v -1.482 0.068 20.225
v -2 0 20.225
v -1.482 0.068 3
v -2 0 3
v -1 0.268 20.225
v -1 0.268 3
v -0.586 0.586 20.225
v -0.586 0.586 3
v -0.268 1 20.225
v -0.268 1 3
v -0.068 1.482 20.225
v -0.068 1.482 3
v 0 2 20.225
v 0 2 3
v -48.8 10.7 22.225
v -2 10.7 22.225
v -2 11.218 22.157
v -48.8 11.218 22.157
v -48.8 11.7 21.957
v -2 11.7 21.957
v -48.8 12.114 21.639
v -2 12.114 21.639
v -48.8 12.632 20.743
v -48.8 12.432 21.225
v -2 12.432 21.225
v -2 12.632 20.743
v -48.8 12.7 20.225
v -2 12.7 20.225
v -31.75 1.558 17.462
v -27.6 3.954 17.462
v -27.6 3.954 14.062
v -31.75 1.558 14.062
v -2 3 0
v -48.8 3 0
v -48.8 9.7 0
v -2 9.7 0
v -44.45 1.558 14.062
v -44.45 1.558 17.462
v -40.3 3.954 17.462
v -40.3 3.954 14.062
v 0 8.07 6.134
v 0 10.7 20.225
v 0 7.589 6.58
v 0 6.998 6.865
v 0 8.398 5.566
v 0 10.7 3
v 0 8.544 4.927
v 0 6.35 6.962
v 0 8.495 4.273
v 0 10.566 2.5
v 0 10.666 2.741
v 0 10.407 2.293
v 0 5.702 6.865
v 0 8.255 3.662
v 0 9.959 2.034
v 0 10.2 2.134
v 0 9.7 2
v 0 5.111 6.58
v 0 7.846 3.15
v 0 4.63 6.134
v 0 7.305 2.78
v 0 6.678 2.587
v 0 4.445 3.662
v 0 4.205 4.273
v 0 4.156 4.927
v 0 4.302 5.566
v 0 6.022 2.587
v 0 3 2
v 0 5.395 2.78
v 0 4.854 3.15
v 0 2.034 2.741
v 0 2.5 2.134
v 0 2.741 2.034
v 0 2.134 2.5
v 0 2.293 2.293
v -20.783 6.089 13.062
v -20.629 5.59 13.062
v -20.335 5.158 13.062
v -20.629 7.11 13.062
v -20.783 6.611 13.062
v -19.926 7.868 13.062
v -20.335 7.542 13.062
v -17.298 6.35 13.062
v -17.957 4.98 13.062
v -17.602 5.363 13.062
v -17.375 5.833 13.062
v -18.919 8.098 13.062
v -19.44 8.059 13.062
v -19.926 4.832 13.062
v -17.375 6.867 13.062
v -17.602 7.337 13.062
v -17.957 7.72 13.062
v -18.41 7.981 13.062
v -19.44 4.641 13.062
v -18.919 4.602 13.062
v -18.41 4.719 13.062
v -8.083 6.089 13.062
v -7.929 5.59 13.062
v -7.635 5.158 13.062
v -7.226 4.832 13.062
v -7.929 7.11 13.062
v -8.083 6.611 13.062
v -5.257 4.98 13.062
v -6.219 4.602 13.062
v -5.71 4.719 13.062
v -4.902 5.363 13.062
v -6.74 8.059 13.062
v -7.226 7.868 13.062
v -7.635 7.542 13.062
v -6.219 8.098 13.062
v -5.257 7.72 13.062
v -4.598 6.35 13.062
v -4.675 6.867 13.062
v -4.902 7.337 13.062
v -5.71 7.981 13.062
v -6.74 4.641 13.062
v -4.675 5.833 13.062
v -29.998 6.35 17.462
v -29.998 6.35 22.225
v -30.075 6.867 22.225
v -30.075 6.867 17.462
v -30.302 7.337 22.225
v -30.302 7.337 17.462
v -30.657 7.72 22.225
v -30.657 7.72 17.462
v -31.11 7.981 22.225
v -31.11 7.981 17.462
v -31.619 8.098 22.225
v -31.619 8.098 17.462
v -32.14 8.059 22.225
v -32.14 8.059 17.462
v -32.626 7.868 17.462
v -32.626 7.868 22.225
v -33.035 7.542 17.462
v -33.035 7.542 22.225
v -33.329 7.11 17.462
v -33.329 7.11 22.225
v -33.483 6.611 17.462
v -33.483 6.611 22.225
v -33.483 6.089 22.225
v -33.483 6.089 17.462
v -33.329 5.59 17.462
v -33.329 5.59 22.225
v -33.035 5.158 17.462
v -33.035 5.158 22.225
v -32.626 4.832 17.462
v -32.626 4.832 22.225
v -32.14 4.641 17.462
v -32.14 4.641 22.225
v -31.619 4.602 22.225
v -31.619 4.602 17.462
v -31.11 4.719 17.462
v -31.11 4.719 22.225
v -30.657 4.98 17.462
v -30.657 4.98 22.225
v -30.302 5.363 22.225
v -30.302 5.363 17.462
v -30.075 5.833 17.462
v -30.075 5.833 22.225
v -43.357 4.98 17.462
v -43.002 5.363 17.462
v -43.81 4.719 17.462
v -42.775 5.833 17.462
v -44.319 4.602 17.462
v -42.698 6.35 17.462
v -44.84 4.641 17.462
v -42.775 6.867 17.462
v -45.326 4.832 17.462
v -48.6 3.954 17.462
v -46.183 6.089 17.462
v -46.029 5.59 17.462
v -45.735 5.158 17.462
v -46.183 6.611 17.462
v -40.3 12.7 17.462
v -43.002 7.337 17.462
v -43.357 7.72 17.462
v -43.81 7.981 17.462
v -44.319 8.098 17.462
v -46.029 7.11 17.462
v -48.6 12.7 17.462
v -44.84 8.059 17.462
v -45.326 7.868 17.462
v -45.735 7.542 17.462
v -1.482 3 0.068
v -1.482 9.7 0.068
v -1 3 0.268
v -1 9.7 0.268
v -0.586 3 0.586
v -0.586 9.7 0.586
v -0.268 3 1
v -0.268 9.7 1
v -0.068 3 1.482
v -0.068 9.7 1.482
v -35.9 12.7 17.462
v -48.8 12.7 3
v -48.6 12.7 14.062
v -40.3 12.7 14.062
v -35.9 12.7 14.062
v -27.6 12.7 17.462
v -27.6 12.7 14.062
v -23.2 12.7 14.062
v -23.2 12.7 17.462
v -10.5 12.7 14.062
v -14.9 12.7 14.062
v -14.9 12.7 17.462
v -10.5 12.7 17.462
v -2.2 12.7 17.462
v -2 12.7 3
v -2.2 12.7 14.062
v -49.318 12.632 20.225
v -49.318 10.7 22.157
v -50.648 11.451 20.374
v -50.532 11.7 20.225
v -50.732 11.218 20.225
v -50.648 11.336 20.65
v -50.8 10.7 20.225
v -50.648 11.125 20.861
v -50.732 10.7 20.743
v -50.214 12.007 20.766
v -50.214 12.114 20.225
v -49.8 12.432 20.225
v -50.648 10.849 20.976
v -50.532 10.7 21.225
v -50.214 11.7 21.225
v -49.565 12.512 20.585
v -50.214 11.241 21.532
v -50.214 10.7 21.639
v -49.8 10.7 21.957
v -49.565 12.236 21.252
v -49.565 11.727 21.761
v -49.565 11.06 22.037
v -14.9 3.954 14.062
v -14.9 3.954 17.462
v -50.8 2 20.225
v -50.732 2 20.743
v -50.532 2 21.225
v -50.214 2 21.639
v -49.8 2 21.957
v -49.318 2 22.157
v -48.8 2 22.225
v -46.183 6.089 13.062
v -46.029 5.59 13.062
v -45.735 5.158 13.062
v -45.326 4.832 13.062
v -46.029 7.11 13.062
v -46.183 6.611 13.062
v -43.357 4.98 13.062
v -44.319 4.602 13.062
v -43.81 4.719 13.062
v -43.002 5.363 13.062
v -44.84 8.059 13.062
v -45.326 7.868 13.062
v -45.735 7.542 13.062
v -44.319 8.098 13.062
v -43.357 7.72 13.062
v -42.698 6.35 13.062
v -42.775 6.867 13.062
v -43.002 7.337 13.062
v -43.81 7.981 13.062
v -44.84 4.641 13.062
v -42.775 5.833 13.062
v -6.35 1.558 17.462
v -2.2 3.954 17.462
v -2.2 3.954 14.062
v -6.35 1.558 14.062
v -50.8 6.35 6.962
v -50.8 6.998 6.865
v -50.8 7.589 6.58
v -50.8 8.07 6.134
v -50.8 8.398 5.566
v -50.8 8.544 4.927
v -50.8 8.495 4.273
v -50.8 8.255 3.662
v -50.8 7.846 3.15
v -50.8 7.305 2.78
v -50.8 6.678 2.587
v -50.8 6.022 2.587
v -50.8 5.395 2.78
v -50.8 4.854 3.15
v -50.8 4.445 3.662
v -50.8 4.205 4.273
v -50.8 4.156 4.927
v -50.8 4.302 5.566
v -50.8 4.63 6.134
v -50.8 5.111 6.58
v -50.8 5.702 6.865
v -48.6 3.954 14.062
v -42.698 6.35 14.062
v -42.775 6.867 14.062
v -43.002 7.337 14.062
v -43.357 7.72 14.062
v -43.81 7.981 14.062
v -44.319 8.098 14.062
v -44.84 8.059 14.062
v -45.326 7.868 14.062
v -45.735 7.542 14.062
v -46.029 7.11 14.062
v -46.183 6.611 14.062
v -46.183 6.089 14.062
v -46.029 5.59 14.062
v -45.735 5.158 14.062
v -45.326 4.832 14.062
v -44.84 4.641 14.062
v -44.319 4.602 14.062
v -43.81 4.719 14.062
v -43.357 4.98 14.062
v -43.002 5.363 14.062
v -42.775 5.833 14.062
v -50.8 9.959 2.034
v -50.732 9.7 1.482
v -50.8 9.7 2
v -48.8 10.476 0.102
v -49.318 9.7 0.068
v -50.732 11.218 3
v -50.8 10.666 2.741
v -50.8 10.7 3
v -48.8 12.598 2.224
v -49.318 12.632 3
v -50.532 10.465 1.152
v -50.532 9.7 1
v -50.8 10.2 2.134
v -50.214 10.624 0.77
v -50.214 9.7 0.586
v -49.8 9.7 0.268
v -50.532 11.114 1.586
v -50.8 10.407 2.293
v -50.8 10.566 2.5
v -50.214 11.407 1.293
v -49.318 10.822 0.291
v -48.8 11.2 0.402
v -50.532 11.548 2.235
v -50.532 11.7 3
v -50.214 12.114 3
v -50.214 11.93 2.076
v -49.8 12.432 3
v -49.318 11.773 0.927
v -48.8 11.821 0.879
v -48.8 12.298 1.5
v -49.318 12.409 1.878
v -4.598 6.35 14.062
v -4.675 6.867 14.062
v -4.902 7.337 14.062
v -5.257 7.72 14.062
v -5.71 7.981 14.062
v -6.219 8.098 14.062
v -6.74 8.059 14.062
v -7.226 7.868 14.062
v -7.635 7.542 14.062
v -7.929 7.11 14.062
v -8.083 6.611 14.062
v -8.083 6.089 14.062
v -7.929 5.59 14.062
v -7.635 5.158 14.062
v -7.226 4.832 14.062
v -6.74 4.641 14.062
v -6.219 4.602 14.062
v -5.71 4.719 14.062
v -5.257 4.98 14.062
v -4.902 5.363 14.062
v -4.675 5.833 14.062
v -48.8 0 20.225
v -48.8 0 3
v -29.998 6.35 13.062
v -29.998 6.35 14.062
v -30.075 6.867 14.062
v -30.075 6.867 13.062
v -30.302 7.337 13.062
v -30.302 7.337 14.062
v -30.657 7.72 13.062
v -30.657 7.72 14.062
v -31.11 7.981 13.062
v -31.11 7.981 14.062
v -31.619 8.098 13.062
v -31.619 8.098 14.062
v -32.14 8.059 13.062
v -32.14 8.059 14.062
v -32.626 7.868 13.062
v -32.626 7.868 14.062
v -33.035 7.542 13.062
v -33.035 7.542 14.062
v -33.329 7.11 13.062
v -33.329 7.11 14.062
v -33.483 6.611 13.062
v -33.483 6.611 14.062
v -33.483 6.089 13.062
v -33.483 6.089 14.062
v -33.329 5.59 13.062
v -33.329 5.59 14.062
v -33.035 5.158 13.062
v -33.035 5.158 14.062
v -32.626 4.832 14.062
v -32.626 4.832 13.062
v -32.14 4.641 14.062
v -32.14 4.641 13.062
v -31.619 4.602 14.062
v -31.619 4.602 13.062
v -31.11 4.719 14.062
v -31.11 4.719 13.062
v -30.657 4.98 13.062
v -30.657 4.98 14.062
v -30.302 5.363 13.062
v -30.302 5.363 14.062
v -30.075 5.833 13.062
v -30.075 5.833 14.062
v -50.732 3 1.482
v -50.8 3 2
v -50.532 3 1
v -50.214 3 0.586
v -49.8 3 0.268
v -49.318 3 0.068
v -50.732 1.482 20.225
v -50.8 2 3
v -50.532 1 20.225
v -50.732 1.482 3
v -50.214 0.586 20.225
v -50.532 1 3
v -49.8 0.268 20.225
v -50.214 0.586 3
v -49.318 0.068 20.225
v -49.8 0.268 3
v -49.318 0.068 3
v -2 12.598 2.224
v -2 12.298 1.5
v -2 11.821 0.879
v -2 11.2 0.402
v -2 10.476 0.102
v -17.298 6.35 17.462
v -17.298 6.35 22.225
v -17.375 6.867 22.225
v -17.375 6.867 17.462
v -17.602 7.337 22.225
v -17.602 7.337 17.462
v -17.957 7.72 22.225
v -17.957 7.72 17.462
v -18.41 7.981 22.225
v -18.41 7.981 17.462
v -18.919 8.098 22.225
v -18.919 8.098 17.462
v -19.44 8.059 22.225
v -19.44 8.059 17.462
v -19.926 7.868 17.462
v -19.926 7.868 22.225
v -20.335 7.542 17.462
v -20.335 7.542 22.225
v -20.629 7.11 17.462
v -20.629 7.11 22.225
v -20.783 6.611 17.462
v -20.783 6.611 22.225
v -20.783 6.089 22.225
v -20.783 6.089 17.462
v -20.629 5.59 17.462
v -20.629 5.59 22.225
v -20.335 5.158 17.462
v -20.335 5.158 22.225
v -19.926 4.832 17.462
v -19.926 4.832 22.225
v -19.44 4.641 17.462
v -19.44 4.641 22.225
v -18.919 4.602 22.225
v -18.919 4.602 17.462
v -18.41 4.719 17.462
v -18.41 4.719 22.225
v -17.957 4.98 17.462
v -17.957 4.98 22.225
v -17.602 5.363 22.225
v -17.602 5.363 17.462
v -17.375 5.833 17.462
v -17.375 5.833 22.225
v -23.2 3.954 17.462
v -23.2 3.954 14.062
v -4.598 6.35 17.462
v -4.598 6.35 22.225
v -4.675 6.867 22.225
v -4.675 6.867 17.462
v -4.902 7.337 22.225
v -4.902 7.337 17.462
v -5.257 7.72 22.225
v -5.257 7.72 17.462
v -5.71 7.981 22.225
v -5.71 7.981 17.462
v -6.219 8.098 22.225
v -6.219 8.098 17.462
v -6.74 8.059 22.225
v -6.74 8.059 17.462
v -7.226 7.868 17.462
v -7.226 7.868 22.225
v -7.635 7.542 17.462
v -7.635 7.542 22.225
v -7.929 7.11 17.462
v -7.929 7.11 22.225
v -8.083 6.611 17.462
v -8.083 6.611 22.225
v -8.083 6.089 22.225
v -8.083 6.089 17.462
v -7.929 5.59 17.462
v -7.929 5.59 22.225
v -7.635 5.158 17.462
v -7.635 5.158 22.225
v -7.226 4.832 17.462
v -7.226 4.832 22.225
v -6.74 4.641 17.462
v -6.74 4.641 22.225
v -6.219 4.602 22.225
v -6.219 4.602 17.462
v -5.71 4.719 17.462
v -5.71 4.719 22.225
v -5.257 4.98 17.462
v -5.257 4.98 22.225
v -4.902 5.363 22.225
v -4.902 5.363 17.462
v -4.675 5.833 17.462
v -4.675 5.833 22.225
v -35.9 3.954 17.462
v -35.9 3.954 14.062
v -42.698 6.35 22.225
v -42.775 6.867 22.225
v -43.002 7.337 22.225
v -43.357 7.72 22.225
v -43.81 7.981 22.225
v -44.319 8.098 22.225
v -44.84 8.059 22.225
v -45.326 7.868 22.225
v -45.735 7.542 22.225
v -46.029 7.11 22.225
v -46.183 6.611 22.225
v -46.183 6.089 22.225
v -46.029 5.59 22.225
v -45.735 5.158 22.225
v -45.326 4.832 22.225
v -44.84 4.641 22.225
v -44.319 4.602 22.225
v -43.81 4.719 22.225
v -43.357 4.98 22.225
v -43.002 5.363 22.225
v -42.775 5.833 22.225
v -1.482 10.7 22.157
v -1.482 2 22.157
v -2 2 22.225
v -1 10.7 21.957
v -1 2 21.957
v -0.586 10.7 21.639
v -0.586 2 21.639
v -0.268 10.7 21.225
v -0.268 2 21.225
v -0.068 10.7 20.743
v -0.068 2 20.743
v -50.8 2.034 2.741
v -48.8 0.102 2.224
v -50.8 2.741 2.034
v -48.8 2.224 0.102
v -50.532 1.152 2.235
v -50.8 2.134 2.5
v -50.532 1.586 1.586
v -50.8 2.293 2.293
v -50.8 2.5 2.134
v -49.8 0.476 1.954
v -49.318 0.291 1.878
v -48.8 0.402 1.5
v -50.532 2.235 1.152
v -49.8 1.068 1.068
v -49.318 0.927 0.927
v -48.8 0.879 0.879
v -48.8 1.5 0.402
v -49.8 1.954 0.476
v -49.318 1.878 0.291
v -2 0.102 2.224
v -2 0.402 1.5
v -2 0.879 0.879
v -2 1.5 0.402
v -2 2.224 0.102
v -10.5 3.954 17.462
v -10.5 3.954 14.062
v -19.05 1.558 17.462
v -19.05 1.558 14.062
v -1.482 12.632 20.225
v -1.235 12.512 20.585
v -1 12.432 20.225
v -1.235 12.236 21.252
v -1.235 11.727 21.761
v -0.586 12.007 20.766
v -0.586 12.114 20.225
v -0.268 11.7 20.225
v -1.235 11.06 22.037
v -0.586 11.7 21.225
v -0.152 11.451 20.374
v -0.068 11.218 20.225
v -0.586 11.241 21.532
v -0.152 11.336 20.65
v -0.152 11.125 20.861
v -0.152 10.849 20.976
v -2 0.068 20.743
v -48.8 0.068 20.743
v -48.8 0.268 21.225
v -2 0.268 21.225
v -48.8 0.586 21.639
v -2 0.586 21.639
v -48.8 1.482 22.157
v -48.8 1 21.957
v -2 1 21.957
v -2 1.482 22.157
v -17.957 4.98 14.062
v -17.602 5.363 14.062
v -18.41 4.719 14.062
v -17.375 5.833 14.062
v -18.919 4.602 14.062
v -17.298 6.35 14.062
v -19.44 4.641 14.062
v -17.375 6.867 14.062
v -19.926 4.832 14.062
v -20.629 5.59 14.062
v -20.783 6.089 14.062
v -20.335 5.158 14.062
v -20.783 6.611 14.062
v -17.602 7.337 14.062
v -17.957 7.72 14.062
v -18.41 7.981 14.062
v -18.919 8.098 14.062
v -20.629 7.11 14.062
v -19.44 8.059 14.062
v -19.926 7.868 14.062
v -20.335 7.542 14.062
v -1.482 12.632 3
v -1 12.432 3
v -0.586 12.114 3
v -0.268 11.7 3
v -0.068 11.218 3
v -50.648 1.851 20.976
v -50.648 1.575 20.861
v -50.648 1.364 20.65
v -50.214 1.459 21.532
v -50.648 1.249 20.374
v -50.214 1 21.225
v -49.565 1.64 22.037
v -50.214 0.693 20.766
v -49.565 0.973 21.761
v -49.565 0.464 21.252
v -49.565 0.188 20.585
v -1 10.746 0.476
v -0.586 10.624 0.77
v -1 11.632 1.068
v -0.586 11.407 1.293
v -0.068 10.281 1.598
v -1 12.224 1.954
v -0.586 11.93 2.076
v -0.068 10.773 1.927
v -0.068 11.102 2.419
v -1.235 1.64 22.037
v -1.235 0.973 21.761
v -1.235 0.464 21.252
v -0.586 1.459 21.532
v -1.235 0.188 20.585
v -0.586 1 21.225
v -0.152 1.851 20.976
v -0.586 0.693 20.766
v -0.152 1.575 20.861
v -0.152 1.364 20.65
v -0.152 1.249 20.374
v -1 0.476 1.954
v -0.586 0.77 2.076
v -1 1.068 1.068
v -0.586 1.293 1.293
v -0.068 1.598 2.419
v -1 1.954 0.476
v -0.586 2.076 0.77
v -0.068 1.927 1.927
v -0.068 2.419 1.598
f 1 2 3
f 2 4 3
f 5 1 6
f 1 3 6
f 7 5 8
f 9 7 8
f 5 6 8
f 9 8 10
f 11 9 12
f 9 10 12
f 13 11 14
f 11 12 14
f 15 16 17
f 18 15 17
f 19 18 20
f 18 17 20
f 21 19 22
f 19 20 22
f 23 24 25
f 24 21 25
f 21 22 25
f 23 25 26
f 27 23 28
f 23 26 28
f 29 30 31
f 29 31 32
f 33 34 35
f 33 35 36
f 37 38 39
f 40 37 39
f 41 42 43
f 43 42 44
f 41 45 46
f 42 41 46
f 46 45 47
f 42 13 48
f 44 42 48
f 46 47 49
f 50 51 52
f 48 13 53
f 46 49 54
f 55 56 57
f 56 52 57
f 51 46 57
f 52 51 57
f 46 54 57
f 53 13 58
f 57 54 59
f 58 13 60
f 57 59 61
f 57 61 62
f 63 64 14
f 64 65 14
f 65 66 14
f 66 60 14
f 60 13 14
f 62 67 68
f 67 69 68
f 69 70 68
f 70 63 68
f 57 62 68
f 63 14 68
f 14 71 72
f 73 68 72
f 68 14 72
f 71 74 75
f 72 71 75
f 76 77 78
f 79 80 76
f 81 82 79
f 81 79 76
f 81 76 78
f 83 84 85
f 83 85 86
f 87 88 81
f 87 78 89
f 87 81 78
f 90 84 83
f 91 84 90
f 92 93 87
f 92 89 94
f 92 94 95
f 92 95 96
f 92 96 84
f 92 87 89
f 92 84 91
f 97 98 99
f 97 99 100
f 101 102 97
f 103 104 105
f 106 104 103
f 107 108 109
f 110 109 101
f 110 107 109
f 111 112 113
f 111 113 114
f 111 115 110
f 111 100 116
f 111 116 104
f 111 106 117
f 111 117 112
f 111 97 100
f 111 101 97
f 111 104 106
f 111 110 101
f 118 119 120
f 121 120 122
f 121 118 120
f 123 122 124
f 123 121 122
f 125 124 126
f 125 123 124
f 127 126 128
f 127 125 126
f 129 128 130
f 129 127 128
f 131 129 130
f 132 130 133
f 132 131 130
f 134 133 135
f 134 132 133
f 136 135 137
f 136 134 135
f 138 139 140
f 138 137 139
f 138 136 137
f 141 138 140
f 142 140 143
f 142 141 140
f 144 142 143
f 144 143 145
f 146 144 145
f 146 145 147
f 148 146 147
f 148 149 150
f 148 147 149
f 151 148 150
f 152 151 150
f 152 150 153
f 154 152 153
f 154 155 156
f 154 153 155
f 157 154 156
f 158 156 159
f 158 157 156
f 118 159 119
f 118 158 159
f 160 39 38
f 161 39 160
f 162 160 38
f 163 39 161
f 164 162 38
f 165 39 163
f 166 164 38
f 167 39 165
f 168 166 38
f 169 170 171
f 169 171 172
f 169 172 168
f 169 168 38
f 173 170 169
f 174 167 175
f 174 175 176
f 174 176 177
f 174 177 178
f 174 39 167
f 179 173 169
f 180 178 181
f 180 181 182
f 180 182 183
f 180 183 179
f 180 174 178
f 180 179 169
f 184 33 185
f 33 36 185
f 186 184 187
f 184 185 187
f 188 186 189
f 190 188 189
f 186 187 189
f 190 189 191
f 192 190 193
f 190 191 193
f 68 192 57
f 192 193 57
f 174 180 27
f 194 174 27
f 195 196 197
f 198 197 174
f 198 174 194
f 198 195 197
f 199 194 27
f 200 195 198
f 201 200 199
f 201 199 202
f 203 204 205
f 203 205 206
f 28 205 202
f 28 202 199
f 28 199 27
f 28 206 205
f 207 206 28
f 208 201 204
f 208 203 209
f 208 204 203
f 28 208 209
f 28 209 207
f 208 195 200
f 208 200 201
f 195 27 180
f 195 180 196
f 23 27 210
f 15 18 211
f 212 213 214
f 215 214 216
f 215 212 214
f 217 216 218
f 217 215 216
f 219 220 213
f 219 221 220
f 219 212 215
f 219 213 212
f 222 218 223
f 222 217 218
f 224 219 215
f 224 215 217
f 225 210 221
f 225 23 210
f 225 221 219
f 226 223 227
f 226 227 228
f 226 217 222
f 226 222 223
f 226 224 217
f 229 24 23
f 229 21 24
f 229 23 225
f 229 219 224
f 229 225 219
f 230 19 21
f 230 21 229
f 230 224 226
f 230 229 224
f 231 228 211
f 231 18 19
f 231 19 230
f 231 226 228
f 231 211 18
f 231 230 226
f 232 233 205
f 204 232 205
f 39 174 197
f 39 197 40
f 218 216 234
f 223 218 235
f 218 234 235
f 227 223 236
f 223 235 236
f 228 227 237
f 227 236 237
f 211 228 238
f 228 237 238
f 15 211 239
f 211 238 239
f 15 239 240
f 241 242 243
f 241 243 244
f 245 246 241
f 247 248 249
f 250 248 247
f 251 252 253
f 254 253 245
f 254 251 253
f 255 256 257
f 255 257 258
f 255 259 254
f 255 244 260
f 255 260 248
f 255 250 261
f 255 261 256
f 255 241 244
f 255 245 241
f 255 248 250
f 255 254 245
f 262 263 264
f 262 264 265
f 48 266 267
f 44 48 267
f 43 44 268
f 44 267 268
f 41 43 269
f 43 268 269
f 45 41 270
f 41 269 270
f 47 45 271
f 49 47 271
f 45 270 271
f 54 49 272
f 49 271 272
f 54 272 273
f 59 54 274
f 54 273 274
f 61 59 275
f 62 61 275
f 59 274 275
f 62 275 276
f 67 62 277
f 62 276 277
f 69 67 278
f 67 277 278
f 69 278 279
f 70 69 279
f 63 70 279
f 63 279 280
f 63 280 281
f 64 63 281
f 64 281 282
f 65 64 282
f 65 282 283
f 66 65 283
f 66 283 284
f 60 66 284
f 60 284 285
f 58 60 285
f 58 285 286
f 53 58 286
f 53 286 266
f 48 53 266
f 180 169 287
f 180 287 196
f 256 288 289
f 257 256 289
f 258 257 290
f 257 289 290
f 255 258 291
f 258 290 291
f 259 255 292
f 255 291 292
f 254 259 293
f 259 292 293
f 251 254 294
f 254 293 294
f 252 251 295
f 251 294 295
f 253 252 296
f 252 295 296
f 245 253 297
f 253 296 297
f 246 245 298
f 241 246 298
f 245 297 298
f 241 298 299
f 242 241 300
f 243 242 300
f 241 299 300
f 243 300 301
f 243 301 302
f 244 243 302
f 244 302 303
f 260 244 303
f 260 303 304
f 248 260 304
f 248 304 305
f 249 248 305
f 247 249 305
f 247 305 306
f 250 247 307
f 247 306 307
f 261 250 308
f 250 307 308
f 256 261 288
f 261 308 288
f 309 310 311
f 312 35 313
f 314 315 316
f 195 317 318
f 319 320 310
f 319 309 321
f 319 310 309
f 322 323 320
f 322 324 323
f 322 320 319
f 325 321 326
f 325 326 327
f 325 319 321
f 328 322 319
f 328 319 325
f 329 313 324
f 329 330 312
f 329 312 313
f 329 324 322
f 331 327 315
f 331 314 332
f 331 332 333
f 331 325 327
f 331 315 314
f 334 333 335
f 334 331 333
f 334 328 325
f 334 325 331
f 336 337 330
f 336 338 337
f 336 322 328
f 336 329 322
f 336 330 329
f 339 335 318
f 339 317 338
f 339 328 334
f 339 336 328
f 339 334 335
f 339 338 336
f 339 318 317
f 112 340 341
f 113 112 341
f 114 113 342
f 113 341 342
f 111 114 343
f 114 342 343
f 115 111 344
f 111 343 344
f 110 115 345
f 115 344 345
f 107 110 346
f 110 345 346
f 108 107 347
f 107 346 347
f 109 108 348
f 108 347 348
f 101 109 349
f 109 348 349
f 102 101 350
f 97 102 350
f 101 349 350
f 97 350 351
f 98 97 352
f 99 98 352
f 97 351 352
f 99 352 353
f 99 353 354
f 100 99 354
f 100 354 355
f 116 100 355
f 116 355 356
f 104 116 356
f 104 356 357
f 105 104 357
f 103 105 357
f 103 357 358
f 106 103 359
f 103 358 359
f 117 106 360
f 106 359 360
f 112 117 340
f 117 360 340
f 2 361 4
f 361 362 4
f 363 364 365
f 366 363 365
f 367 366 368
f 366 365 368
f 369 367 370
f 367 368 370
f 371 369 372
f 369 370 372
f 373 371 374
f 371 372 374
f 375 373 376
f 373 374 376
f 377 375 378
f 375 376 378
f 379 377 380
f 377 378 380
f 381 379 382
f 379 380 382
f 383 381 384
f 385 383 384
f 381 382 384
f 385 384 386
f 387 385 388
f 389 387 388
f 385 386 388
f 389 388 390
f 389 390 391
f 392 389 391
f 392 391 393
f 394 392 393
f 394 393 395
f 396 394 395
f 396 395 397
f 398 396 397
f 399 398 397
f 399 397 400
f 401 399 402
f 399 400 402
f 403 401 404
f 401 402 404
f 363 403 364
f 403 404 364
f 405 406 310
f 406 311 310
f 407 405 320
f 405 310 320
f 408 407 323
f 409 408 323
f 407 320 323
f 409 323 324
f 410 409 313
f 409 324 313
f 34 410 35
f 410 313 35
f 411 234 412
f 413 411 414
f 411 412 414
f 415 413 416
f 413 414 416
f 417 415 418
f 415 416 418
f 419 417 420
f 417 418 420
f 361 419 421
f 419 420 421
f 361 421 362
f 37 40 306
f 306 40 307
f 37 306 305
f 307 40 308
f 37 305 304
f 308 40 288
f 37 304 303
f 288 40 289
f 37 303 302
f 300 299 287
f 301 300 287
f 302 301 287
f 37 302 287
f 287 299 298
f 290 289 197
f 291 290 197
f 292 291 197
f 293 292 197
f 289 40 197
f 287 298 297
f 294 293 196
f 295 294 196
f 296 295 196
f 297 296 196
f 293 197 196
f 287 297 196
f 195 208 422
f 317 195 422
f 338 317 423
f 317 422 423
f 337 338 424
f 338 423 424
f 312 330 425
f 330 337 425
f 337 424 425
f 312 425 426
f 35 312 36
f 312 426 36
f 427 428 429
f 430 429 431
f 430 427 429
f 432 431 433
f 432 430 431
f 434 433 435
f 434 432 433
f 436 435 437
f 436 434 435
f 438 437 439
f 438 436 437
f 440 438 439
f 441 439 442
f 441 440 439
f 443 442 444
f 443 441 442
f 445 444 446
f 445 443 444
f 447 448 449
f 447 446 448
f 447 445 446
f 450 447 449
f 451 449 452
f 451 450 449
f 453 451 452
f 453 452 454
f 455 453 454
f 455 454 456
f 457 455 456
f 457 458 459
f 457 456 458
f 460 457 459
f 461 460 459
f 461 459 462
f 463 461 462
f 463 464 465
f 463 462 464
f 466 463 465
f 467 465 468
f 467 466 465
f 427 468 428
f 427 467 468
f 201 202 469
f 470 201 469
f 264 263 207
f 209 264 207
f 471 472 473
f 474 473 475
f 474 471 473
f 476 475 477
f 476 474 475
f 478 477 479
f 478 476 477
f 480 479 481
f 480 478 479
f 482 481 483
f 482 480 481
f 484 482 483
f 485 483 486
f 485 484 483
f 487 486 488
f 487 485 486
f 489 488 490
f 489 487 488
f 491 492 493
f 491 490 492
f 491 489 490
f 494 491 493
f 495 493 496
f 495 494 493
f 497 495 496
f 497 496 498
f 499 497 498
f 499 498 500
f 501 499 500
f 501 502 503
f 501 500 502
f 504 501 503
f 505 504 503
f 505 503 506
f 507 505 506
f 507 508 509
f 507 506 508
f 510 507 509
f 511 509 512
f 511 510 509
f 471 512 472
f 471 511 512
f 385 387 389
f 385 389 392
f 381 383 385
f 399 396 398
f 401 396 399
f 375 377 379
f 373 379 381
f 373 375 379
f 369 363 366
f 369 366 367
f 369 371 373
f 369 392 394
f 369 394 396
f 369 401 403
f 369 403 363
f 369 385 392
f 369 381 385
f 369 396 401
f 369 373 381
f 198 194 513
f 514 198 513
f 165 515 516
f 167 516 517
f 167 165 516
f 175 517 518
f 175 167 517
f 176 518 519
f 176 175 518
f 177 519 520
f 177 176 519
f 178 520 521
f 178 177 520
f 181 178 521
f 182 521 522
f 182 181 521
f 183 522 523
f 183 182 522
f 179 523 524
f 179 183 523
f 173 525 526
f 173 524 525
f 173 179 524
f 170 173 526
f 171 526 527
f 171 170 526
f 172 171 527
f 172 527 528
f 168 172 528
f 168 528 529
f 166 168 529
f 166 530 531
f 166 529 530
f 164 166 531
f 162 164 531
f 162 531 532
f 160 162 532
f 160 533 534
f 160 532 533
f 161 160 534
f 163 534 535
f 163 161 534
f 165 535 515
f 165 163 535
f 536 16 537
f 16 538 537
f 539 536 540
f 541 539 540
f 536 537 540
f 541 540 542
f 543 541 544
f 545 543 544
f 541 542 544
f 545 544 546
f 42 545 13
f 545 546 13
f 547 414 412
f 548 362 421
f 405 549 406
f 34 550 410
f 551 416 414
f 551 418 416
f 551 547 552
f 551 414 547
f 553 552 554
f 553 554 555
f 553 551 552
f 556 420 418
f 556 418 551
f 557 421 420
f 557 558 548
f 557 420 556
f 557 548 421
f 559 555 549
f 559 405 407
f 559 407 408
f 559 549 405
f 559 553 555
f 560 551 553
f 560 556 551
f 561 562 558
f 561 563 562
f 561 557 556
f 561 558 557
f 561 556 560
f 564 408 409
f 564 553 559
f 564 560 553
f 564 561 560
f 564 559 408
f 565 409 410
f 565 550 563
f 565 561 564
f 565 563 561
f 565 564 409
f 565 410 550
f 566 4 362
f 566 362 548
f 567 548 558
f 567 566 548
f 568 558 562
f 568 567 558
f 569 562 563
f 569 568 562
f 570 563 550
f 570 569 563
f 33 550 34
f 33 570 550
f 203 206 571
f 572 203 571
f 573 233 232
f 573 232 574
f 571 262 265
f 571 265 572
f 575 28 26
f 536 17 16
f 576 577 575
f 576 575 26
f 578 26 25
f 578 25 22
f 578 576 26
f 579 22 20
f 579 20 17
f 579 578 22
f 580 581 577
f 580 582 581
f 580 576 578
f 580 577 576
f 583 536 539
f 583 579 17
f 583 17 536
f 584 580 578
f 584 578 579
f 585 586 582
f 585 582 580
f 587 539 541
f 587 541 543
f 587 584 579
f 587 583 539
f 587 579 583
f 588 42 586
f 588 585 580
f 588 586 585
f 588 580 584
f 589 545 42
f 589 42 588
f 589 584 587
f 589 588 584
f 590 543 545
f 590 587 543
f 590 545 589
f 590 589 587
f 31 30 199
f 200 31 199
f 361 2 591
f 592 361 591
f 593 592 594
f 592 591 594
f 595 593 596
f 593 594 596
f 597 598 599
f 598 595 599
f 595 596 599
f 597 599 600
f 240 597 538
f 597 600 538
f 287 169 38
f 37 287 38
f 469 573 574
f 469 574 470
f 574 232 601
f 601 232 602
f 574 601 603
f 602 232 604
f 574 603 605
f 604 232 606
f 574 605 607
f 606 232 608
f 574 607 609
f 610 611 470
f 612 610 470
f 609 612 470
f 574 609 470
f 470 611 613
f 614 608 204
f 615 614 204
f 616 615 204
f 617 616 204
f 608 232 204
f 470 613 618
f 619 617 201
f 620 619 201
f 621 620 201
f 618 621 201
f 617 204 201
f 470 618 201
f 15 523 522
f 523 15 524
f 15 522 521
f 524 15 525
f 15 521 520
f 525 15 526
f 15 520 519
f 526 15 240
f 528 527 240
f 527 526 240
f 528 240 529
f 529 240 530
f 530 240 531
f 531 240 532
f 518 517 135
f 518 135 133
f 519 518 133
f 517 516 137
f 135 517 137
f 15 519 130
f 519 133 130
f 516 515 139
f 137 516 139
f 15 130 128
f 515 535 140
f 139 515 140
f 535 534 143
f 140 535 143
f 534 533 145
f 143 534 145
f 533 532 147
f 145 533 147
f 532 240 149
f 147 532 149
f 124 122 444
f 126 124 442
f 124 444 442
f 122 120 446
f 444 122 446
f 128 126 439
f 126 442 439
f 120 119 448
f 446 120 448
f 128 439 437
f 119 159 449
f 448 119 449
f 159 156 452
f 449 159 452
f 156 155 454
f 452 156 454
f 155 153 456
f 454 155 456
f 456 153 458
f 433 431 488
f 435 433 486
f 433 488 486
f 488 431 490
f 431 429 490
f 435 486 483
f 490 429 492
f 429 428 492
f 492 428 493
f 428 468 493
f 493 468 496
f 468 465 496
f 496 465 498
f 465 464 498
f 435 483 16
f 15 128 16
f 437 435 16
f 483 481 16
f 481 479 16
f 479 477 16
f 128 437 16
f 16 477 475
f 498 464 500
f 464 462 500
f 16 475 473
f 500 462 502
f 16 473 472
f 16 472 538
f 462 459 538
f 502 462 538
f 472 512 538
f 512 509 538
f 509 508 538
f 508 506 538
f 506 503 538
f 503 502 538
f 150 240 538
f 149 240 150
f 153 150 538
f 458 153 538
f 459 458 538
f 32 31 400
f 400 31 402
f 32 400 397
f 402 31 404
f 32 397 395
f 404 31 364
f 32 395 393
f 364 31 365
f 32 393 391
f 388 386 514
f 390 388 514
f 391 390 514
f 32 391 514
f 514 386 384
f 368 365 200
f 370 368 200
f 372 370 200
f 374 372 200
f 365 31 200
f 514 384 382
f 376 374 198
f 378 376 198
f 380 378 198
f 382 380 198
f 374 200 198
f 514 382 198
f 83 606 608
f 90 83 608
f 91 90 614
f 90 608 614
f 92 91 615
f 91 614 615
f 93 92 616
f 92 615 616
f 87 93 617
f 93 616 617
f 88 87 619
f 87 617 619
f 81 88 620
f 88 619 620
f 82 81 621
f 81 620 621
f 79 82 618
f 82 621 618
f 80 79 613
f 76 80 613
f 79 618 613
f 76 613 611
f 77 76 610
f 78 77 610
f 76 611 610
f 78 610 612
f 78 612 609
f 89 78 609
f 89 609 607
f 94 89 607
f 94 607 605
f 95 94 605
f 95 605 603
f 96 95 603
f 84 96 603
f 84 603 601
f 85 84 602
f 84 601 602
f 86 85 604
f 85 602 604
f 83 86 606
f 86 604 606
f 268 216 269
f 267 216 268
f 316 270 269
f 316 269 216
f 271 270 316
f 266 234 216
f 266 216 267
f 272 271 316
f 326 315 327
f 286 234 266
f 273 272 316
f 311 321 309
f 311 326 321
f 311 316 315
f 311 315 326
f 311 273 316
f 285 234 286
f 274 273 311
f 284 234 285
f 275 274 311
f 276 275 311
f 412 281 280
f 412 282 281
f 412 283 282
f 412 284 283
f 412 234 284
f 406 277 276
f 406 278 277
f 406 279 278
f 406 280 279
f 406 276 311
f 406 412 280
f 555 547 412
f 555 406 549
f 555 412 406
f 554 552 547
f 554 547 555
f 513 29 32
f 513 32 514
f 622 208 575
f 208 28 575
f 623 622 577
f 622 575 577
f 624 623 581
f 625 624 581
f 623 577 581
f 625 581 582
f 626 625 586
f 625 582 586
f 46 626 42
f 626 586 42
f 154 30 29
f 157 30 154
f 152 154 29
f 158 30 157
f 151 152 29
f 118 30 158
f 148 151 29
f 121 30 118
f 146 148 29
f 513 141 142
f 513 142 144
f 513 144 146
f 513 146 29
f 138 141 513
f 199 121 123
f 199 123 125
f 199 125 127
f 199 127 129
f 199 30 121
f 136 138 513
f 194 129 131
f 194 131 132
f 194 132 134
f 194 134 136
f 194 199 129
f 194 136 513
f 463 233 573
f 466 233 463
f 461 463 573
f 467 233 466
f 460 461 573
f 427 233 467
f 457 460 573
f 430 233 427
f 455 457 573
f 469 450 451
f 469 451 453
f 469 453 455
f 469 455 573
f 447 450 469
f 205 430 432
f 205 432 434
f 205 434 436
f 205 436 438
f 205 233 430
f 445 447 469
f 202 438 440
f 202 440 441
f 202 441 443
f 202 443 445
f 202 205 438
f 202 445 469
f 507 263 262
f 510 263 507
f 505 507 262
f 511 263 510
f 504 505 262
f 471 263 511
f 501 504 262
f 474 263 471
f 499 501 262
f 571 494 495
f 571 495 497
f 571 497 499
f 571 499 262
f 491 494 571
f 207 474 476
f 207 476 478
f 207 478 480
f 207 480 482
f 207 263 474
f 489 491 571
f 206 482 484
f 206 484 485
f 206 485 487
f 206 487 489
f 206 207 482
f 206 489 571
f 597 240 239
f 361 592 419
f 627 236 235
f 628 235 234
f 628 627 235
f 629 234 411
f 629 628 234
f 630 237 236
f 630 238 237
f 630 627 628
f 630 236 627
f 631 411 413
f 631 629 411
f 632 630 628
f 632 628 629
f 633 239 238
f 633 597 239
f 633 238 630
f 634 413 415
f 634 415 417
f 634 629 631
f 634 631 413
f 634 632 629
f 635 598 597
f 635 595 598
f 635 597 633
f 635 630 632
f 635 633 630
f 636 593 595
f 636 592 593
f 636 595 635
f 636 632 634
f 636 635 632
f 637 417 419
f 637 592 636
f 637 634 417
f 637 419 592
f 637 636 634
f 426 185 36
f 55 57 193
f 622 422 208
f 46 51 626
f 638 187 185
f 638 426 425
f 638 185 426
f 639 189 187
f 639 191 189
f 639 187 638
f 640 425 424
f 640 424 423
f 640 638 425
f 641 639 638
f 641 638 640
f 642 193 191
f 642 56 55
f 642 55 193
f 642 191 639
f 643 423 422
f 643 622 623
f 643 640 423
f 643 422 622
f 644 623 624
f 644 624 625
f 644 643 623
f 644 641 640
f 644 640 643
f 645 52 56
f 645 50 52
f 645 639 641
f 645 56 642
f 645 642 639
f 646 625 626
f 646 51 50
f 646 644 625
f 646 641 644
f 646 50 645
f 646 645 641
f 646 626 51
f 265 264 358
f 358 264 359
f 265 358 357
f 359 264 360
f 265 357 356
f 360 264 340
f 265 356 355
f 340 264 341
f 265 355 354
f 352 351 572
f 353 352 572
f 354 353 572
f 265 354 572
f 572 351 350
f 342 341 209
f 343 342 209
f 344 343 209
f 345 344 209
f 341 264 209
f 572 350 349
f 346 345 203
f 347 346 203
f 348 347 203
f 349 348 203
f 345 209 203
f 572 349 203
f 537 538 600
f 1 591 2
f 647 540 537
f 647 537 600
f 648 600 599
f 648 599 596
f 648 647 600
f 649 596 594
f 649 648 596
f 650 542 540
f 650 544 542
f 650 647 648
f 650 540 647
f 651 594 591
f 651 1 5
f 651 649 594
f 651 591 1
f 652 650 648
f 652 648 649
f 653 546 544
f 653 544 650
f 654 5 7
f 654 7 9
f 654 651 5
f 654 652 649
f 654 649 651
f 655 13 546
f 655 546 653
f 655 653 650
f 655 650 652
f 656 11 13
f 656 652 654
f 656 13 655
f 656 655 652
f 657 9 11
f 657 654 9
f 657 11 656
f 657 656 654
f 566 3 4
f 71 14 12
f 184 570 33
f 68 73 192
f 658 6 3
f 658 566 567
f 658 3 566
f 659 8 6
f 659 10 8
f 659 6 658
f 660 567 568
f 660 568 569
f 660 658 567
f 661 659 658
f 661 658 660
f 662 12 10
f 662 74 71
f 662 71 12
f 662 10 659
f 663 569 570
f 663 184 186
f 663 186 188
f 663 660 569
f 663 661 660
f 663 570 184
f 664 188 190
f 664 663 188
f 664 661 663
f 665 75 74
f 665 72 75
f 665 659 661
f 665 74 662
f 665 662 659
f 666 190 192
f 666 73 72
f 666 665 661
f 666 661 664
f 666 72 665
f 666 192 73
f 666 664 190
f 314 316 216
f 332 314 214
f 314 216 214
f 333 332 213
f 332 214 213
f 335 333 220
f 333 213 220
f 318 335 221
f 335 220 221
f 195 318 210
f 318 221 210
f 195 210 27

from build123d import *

# Parameters (mm, degrees)
SKETCH1_W           = 50.8
SKETCH1_H           = 22.225
BOSS_EXTRUDE1_DEPTH = 12.7
SKETCH2_R           = 2.2
CUT_EXTRUDE1_DEPTH  = 57.884801353
SKETCH4_R           = 1.7525
CUT_EXTRUDE3_DEPTH  = 3.4
CUT_EXTRUDE4_START  = -3.4
SKETCH4_3_R         = 1.7525
CUT_EXTRUDE4_DEPTH  = 1
CUT_EXTRUDE5_REACH  = 57.198
SKETCH4_4_R         = 1.7525
FILLET1_R           = 3
FILLET2_R           = 2
FILLET3_R           = 2


with BuildPart() as part:
    # Sketch1 → Boss-Extrude1 (new body)
    with BuildSketch(Plane(origin=(0, 0, 0), x_dir=(1, 0, 0), z_dir=(0, 1, 0))):
        with Locations((-25.4, -11.1125)):
            Rectangle(SKETCH1_W, SKETCH1_H)
    extrude(amount=BOSS_EXTRUDE1_DEPTH)

    # Sketch2 → Cut-Extrude1 (cut, through all)
    with BuildSketch(Plane.ZY.offset(50.8)):
        with Locations((4.7625, 6.35)):
            Circle(SKETCH2_R)
    extrude(amount=-CUT_EXTRUDE1_DEPTH, mode=Mode.SUBTRACT)

    # Sketch4 → Cut-Extrude3 (cut)
    # profile 1 of 9: a face of its own
    with BuildSketch(Plane.XY.offset(17.4625)):
        Polygon((-40.3, 12.7), (-40.3, 8.746003617), (-44.45, 11.142007234), (-48.6, 8.746003617), (-48.6, 12.7), align=None)
    # profile 2 of 9: a face of its own
    with BuildSketch(Plane.XY.offset(17.4625)):
        Polygon((-48.6, 8.746003617), (-48.6, 3.953996383), (-44.45, 1.557992766), (-40.3, 3.953996383), (-40.3, 8.746003617), (-44.45, 11.142007234), align=None)
        with Locations((-44.45, 6.35)):
            Circle(SKETCH4_R, mode=Mode.SUBTRACT)
    # profile 3 of 9: a face of its own
    with BuildSketch(Plane.XY.offset(17.4625)):
        Polygon((-35.9, 12.7), (-27.6, 12.7), (-27.6, 8.746003617), (-27.6, 3.953996383), (-31.75, 1.557992766), (-35.9, 3.953996383), (-35.9, 8.746003617), align=None)
        with Locations((-31.75, 6.35)):
            Circle(SKETCH4_R, mode=Mode.SUBTRACT)
    # profile 4 of 9: a face of its own
    with BuildSketch(Plane.XY.offset(17.4625)):
        with Locations((-31.75, 6.35)):
            Circle(SKETCH4_R)
    # profile 5 of 9: a face of its own
    with BuildSketch(Plane.XY.offset(17.4625)):
        with Locations((-44.45, 6.35)):
            Circle(SKETCH4_R)
    # profile 6 of 9: a face of its own
    with BuildSketch(Plane.XY.offset(17.4625)):
        Polygon((-23.2, 12.7), (-14.9, 12.7), (-14.9, 8.746003617), (-14.9, 3.953996383), (-19.05, 1.557992766), (-23.2, 3.953996383), (-23.2, 8.746003617), align=None)
        with Locations((-19.05, 6.35)):
            Circle(SKETCH4_R, mode=Mode.SUBTRACT)
    # profile 7 of 9: a face of its own
    with BuildSketch(Plane.XY.offset(17.4625)):
        with Locations((-19.05, 6.35)):
            Circle(SKETCH4_R)
    # profile 8 of 9: a face of its own
    with BuildSketch(Plane.XY.offset(17.4625)):
        Polygon((-10.5, 12.7), (-2.2, 12.7), (-2.2, 8.746003617), (-2.2, 3.953996383), (-6.35, 1.557992766), (-10.5, 3.953996383), (-10.5, 8.746003617), align=None)
        with Locations((-6.35, 6.35)):
            Circle(SKETCH4_R, mode=Mode.SUBTRACT)
    # profile 9 of 9: a face of its own
    with BuildSketch(Plane.XY.offset(17.4625)):
        with Locations((-6.35, 6.35)):
            Circle(SKETCH4_R)
    extrude(amount=-CUT_EXTRUDE3_DEPTH, mode=Mode.SUBTRACT)

    # Sketch4<3> → Cut-Extrude4 (cut)
    with BuildSketch(Plane.XY.offset(17.4625).offset(CUT_EXTRUDE4_START)):
        with Locations((-44.45, 6.35)):
            Circle(SKETCH4_3_R)
        with Locations((-31.75, 6.35)):
            Circle(SKETCH4_3_R)
        with Locations((-19.05, 6.35)):
            Circle(SKETCH4_3_R)
        with Locations((-6.35, 6.35)):
            Circle(SKETCH4_3_R)
    extrude(amount=-CUT_EXTRUDE4_DEPTH, mode=Mode.SUBTRACT)

    # Sketch4<4> → Cut-Extrude5 (cut, up to next)
    with BuildSketch(Plane.XY.offset(17.4625), mode=Mode.PRIVATE) as cut_extrude5_sk1:
        with Locations((-44.45, 6.35)):
            Circle(SKETCH4_4_R)
    cut_extrude5_tool1 = extrude(cut_extrude5_sk1.sketch, amount=CUT_EXTRUDE5_REACH, mode=Mode.PRIVATE) & part.part
    # Sketch4<4> → Cut-Extrude5 (cut, up to next)
    with BuildSketch(Plane.XY.offset(17.4625), mode=Mode.PRIVATE) as cut_extrude5_sk2:
        with Locations((-31.75, 6.35)):
            Circle(SKETCH4_4_R)
    cut_extrude5_tool2 = extrude(cut_extrude5_sk2.sketch, amount=CUT_EXTRUDE5_REACH, mode=Mode.PRIVATE) & part.part
    # Sketch4<4> → Cut-Extrude5 (cut, up to next)
    with BuildSketch(Plane.XY.offset(17.4625), mode=Mode.PRIVATE) as cut_extrude5_sk3:
        with Locations((-19.05, 6.35)):
            Circle(SKETCH4_4_R)
    cut_extrude5_tool3 = extrude(cut_extrude5_sk3.sketch, amount=CUT_EXTRUDE5_REACH, mode=Mode.PRIVATE) & part.part
    # Sketch4<4> → Cut-Extrude5 (cut, up to next)
    with BuildSketch(Plane.XY.offset(17.4625), mode=Mode.PRIVATE) as cut_extrude5_sk4:
        with Locations((-6.35, 6.35)):
            Circle(SKETCH4_4_R)
    cut_extrude5_tool4 = extrude(cut_extrude5_sk4.sketch, amount=CUT_EXTRUDE5_REACH, mode=Mode.PRIVATE) & part.part
    add(cut_extrude5_tool1.solids().sort_by_distance((-44.45, 6.35, 17.4625))[0], mode=Mode.SUBTRACT)
    add(cut_extrude5_tool2.solids().sort_by_distance((-31.75, 6.35, 17.4625))[0], mode=Mode.SUBTRACT)
    add(cut_extrude5_tool3.solids().sort_by_distance((-19.05, 6.35, 17.4625))[0], mode=Mode.SUBTRACT)
    add(cut_extrude5_tool4.solids().sort_by_distance((-6.35, 6.35, 17.4625))[0], mode=Mode.SUBTRACT)

    # Fillet1
    fillet1_edges = [part.edges().sort_by_distance(p)[0] for p in [
        (-25.4, 0, 0),
        (-25.4, 12.7, 0),
    ]]
    fillet(fillet1_edges, radius=FILLET1_R)

    # Fillet2
    fillet2_edges = [part.edges().sort_by_distance(p)[0] for p in [
        (-25.4, 12.7, 22.225),
        (-25.4, 0, 22.225),
    ]]
    fillet(fillet2_edges, radius=FILLET2_R)

    # Fillet3
    fillet3_edges = [part.edges().sort_by_distance(p)[0] for p in [
        (-50.8, 6.35, 0),
        (0, 6.35, 0),
        (-50.8, 0, 11.6125),
        (-50.8, 12.7, 11.6125),
        (-50.8, 11.821320344, 0.878679656),
        (-50.8, 0.878679656, 0.878679656),
        (0, 11.821320344, 0.878679656),
        (0, 0.878679656, 0.878679656),
        (0, 6.35, 22.225),
        (-50.8, 6.35, 22.225),
        (0, 0, 11.6125),
        (0, 12.7, 11.6125),
        (0, 12.114213562, 21.639213562),
        (0, 0.585786438, 21.639213562),
        (-50.8, 12.114213562, 21.639213562),
        (-50.8, 0.585786438, 21.639213562),
    ]]
    fillet(fillet3_edges, radius=FILLET3_R)


solid = part.part
